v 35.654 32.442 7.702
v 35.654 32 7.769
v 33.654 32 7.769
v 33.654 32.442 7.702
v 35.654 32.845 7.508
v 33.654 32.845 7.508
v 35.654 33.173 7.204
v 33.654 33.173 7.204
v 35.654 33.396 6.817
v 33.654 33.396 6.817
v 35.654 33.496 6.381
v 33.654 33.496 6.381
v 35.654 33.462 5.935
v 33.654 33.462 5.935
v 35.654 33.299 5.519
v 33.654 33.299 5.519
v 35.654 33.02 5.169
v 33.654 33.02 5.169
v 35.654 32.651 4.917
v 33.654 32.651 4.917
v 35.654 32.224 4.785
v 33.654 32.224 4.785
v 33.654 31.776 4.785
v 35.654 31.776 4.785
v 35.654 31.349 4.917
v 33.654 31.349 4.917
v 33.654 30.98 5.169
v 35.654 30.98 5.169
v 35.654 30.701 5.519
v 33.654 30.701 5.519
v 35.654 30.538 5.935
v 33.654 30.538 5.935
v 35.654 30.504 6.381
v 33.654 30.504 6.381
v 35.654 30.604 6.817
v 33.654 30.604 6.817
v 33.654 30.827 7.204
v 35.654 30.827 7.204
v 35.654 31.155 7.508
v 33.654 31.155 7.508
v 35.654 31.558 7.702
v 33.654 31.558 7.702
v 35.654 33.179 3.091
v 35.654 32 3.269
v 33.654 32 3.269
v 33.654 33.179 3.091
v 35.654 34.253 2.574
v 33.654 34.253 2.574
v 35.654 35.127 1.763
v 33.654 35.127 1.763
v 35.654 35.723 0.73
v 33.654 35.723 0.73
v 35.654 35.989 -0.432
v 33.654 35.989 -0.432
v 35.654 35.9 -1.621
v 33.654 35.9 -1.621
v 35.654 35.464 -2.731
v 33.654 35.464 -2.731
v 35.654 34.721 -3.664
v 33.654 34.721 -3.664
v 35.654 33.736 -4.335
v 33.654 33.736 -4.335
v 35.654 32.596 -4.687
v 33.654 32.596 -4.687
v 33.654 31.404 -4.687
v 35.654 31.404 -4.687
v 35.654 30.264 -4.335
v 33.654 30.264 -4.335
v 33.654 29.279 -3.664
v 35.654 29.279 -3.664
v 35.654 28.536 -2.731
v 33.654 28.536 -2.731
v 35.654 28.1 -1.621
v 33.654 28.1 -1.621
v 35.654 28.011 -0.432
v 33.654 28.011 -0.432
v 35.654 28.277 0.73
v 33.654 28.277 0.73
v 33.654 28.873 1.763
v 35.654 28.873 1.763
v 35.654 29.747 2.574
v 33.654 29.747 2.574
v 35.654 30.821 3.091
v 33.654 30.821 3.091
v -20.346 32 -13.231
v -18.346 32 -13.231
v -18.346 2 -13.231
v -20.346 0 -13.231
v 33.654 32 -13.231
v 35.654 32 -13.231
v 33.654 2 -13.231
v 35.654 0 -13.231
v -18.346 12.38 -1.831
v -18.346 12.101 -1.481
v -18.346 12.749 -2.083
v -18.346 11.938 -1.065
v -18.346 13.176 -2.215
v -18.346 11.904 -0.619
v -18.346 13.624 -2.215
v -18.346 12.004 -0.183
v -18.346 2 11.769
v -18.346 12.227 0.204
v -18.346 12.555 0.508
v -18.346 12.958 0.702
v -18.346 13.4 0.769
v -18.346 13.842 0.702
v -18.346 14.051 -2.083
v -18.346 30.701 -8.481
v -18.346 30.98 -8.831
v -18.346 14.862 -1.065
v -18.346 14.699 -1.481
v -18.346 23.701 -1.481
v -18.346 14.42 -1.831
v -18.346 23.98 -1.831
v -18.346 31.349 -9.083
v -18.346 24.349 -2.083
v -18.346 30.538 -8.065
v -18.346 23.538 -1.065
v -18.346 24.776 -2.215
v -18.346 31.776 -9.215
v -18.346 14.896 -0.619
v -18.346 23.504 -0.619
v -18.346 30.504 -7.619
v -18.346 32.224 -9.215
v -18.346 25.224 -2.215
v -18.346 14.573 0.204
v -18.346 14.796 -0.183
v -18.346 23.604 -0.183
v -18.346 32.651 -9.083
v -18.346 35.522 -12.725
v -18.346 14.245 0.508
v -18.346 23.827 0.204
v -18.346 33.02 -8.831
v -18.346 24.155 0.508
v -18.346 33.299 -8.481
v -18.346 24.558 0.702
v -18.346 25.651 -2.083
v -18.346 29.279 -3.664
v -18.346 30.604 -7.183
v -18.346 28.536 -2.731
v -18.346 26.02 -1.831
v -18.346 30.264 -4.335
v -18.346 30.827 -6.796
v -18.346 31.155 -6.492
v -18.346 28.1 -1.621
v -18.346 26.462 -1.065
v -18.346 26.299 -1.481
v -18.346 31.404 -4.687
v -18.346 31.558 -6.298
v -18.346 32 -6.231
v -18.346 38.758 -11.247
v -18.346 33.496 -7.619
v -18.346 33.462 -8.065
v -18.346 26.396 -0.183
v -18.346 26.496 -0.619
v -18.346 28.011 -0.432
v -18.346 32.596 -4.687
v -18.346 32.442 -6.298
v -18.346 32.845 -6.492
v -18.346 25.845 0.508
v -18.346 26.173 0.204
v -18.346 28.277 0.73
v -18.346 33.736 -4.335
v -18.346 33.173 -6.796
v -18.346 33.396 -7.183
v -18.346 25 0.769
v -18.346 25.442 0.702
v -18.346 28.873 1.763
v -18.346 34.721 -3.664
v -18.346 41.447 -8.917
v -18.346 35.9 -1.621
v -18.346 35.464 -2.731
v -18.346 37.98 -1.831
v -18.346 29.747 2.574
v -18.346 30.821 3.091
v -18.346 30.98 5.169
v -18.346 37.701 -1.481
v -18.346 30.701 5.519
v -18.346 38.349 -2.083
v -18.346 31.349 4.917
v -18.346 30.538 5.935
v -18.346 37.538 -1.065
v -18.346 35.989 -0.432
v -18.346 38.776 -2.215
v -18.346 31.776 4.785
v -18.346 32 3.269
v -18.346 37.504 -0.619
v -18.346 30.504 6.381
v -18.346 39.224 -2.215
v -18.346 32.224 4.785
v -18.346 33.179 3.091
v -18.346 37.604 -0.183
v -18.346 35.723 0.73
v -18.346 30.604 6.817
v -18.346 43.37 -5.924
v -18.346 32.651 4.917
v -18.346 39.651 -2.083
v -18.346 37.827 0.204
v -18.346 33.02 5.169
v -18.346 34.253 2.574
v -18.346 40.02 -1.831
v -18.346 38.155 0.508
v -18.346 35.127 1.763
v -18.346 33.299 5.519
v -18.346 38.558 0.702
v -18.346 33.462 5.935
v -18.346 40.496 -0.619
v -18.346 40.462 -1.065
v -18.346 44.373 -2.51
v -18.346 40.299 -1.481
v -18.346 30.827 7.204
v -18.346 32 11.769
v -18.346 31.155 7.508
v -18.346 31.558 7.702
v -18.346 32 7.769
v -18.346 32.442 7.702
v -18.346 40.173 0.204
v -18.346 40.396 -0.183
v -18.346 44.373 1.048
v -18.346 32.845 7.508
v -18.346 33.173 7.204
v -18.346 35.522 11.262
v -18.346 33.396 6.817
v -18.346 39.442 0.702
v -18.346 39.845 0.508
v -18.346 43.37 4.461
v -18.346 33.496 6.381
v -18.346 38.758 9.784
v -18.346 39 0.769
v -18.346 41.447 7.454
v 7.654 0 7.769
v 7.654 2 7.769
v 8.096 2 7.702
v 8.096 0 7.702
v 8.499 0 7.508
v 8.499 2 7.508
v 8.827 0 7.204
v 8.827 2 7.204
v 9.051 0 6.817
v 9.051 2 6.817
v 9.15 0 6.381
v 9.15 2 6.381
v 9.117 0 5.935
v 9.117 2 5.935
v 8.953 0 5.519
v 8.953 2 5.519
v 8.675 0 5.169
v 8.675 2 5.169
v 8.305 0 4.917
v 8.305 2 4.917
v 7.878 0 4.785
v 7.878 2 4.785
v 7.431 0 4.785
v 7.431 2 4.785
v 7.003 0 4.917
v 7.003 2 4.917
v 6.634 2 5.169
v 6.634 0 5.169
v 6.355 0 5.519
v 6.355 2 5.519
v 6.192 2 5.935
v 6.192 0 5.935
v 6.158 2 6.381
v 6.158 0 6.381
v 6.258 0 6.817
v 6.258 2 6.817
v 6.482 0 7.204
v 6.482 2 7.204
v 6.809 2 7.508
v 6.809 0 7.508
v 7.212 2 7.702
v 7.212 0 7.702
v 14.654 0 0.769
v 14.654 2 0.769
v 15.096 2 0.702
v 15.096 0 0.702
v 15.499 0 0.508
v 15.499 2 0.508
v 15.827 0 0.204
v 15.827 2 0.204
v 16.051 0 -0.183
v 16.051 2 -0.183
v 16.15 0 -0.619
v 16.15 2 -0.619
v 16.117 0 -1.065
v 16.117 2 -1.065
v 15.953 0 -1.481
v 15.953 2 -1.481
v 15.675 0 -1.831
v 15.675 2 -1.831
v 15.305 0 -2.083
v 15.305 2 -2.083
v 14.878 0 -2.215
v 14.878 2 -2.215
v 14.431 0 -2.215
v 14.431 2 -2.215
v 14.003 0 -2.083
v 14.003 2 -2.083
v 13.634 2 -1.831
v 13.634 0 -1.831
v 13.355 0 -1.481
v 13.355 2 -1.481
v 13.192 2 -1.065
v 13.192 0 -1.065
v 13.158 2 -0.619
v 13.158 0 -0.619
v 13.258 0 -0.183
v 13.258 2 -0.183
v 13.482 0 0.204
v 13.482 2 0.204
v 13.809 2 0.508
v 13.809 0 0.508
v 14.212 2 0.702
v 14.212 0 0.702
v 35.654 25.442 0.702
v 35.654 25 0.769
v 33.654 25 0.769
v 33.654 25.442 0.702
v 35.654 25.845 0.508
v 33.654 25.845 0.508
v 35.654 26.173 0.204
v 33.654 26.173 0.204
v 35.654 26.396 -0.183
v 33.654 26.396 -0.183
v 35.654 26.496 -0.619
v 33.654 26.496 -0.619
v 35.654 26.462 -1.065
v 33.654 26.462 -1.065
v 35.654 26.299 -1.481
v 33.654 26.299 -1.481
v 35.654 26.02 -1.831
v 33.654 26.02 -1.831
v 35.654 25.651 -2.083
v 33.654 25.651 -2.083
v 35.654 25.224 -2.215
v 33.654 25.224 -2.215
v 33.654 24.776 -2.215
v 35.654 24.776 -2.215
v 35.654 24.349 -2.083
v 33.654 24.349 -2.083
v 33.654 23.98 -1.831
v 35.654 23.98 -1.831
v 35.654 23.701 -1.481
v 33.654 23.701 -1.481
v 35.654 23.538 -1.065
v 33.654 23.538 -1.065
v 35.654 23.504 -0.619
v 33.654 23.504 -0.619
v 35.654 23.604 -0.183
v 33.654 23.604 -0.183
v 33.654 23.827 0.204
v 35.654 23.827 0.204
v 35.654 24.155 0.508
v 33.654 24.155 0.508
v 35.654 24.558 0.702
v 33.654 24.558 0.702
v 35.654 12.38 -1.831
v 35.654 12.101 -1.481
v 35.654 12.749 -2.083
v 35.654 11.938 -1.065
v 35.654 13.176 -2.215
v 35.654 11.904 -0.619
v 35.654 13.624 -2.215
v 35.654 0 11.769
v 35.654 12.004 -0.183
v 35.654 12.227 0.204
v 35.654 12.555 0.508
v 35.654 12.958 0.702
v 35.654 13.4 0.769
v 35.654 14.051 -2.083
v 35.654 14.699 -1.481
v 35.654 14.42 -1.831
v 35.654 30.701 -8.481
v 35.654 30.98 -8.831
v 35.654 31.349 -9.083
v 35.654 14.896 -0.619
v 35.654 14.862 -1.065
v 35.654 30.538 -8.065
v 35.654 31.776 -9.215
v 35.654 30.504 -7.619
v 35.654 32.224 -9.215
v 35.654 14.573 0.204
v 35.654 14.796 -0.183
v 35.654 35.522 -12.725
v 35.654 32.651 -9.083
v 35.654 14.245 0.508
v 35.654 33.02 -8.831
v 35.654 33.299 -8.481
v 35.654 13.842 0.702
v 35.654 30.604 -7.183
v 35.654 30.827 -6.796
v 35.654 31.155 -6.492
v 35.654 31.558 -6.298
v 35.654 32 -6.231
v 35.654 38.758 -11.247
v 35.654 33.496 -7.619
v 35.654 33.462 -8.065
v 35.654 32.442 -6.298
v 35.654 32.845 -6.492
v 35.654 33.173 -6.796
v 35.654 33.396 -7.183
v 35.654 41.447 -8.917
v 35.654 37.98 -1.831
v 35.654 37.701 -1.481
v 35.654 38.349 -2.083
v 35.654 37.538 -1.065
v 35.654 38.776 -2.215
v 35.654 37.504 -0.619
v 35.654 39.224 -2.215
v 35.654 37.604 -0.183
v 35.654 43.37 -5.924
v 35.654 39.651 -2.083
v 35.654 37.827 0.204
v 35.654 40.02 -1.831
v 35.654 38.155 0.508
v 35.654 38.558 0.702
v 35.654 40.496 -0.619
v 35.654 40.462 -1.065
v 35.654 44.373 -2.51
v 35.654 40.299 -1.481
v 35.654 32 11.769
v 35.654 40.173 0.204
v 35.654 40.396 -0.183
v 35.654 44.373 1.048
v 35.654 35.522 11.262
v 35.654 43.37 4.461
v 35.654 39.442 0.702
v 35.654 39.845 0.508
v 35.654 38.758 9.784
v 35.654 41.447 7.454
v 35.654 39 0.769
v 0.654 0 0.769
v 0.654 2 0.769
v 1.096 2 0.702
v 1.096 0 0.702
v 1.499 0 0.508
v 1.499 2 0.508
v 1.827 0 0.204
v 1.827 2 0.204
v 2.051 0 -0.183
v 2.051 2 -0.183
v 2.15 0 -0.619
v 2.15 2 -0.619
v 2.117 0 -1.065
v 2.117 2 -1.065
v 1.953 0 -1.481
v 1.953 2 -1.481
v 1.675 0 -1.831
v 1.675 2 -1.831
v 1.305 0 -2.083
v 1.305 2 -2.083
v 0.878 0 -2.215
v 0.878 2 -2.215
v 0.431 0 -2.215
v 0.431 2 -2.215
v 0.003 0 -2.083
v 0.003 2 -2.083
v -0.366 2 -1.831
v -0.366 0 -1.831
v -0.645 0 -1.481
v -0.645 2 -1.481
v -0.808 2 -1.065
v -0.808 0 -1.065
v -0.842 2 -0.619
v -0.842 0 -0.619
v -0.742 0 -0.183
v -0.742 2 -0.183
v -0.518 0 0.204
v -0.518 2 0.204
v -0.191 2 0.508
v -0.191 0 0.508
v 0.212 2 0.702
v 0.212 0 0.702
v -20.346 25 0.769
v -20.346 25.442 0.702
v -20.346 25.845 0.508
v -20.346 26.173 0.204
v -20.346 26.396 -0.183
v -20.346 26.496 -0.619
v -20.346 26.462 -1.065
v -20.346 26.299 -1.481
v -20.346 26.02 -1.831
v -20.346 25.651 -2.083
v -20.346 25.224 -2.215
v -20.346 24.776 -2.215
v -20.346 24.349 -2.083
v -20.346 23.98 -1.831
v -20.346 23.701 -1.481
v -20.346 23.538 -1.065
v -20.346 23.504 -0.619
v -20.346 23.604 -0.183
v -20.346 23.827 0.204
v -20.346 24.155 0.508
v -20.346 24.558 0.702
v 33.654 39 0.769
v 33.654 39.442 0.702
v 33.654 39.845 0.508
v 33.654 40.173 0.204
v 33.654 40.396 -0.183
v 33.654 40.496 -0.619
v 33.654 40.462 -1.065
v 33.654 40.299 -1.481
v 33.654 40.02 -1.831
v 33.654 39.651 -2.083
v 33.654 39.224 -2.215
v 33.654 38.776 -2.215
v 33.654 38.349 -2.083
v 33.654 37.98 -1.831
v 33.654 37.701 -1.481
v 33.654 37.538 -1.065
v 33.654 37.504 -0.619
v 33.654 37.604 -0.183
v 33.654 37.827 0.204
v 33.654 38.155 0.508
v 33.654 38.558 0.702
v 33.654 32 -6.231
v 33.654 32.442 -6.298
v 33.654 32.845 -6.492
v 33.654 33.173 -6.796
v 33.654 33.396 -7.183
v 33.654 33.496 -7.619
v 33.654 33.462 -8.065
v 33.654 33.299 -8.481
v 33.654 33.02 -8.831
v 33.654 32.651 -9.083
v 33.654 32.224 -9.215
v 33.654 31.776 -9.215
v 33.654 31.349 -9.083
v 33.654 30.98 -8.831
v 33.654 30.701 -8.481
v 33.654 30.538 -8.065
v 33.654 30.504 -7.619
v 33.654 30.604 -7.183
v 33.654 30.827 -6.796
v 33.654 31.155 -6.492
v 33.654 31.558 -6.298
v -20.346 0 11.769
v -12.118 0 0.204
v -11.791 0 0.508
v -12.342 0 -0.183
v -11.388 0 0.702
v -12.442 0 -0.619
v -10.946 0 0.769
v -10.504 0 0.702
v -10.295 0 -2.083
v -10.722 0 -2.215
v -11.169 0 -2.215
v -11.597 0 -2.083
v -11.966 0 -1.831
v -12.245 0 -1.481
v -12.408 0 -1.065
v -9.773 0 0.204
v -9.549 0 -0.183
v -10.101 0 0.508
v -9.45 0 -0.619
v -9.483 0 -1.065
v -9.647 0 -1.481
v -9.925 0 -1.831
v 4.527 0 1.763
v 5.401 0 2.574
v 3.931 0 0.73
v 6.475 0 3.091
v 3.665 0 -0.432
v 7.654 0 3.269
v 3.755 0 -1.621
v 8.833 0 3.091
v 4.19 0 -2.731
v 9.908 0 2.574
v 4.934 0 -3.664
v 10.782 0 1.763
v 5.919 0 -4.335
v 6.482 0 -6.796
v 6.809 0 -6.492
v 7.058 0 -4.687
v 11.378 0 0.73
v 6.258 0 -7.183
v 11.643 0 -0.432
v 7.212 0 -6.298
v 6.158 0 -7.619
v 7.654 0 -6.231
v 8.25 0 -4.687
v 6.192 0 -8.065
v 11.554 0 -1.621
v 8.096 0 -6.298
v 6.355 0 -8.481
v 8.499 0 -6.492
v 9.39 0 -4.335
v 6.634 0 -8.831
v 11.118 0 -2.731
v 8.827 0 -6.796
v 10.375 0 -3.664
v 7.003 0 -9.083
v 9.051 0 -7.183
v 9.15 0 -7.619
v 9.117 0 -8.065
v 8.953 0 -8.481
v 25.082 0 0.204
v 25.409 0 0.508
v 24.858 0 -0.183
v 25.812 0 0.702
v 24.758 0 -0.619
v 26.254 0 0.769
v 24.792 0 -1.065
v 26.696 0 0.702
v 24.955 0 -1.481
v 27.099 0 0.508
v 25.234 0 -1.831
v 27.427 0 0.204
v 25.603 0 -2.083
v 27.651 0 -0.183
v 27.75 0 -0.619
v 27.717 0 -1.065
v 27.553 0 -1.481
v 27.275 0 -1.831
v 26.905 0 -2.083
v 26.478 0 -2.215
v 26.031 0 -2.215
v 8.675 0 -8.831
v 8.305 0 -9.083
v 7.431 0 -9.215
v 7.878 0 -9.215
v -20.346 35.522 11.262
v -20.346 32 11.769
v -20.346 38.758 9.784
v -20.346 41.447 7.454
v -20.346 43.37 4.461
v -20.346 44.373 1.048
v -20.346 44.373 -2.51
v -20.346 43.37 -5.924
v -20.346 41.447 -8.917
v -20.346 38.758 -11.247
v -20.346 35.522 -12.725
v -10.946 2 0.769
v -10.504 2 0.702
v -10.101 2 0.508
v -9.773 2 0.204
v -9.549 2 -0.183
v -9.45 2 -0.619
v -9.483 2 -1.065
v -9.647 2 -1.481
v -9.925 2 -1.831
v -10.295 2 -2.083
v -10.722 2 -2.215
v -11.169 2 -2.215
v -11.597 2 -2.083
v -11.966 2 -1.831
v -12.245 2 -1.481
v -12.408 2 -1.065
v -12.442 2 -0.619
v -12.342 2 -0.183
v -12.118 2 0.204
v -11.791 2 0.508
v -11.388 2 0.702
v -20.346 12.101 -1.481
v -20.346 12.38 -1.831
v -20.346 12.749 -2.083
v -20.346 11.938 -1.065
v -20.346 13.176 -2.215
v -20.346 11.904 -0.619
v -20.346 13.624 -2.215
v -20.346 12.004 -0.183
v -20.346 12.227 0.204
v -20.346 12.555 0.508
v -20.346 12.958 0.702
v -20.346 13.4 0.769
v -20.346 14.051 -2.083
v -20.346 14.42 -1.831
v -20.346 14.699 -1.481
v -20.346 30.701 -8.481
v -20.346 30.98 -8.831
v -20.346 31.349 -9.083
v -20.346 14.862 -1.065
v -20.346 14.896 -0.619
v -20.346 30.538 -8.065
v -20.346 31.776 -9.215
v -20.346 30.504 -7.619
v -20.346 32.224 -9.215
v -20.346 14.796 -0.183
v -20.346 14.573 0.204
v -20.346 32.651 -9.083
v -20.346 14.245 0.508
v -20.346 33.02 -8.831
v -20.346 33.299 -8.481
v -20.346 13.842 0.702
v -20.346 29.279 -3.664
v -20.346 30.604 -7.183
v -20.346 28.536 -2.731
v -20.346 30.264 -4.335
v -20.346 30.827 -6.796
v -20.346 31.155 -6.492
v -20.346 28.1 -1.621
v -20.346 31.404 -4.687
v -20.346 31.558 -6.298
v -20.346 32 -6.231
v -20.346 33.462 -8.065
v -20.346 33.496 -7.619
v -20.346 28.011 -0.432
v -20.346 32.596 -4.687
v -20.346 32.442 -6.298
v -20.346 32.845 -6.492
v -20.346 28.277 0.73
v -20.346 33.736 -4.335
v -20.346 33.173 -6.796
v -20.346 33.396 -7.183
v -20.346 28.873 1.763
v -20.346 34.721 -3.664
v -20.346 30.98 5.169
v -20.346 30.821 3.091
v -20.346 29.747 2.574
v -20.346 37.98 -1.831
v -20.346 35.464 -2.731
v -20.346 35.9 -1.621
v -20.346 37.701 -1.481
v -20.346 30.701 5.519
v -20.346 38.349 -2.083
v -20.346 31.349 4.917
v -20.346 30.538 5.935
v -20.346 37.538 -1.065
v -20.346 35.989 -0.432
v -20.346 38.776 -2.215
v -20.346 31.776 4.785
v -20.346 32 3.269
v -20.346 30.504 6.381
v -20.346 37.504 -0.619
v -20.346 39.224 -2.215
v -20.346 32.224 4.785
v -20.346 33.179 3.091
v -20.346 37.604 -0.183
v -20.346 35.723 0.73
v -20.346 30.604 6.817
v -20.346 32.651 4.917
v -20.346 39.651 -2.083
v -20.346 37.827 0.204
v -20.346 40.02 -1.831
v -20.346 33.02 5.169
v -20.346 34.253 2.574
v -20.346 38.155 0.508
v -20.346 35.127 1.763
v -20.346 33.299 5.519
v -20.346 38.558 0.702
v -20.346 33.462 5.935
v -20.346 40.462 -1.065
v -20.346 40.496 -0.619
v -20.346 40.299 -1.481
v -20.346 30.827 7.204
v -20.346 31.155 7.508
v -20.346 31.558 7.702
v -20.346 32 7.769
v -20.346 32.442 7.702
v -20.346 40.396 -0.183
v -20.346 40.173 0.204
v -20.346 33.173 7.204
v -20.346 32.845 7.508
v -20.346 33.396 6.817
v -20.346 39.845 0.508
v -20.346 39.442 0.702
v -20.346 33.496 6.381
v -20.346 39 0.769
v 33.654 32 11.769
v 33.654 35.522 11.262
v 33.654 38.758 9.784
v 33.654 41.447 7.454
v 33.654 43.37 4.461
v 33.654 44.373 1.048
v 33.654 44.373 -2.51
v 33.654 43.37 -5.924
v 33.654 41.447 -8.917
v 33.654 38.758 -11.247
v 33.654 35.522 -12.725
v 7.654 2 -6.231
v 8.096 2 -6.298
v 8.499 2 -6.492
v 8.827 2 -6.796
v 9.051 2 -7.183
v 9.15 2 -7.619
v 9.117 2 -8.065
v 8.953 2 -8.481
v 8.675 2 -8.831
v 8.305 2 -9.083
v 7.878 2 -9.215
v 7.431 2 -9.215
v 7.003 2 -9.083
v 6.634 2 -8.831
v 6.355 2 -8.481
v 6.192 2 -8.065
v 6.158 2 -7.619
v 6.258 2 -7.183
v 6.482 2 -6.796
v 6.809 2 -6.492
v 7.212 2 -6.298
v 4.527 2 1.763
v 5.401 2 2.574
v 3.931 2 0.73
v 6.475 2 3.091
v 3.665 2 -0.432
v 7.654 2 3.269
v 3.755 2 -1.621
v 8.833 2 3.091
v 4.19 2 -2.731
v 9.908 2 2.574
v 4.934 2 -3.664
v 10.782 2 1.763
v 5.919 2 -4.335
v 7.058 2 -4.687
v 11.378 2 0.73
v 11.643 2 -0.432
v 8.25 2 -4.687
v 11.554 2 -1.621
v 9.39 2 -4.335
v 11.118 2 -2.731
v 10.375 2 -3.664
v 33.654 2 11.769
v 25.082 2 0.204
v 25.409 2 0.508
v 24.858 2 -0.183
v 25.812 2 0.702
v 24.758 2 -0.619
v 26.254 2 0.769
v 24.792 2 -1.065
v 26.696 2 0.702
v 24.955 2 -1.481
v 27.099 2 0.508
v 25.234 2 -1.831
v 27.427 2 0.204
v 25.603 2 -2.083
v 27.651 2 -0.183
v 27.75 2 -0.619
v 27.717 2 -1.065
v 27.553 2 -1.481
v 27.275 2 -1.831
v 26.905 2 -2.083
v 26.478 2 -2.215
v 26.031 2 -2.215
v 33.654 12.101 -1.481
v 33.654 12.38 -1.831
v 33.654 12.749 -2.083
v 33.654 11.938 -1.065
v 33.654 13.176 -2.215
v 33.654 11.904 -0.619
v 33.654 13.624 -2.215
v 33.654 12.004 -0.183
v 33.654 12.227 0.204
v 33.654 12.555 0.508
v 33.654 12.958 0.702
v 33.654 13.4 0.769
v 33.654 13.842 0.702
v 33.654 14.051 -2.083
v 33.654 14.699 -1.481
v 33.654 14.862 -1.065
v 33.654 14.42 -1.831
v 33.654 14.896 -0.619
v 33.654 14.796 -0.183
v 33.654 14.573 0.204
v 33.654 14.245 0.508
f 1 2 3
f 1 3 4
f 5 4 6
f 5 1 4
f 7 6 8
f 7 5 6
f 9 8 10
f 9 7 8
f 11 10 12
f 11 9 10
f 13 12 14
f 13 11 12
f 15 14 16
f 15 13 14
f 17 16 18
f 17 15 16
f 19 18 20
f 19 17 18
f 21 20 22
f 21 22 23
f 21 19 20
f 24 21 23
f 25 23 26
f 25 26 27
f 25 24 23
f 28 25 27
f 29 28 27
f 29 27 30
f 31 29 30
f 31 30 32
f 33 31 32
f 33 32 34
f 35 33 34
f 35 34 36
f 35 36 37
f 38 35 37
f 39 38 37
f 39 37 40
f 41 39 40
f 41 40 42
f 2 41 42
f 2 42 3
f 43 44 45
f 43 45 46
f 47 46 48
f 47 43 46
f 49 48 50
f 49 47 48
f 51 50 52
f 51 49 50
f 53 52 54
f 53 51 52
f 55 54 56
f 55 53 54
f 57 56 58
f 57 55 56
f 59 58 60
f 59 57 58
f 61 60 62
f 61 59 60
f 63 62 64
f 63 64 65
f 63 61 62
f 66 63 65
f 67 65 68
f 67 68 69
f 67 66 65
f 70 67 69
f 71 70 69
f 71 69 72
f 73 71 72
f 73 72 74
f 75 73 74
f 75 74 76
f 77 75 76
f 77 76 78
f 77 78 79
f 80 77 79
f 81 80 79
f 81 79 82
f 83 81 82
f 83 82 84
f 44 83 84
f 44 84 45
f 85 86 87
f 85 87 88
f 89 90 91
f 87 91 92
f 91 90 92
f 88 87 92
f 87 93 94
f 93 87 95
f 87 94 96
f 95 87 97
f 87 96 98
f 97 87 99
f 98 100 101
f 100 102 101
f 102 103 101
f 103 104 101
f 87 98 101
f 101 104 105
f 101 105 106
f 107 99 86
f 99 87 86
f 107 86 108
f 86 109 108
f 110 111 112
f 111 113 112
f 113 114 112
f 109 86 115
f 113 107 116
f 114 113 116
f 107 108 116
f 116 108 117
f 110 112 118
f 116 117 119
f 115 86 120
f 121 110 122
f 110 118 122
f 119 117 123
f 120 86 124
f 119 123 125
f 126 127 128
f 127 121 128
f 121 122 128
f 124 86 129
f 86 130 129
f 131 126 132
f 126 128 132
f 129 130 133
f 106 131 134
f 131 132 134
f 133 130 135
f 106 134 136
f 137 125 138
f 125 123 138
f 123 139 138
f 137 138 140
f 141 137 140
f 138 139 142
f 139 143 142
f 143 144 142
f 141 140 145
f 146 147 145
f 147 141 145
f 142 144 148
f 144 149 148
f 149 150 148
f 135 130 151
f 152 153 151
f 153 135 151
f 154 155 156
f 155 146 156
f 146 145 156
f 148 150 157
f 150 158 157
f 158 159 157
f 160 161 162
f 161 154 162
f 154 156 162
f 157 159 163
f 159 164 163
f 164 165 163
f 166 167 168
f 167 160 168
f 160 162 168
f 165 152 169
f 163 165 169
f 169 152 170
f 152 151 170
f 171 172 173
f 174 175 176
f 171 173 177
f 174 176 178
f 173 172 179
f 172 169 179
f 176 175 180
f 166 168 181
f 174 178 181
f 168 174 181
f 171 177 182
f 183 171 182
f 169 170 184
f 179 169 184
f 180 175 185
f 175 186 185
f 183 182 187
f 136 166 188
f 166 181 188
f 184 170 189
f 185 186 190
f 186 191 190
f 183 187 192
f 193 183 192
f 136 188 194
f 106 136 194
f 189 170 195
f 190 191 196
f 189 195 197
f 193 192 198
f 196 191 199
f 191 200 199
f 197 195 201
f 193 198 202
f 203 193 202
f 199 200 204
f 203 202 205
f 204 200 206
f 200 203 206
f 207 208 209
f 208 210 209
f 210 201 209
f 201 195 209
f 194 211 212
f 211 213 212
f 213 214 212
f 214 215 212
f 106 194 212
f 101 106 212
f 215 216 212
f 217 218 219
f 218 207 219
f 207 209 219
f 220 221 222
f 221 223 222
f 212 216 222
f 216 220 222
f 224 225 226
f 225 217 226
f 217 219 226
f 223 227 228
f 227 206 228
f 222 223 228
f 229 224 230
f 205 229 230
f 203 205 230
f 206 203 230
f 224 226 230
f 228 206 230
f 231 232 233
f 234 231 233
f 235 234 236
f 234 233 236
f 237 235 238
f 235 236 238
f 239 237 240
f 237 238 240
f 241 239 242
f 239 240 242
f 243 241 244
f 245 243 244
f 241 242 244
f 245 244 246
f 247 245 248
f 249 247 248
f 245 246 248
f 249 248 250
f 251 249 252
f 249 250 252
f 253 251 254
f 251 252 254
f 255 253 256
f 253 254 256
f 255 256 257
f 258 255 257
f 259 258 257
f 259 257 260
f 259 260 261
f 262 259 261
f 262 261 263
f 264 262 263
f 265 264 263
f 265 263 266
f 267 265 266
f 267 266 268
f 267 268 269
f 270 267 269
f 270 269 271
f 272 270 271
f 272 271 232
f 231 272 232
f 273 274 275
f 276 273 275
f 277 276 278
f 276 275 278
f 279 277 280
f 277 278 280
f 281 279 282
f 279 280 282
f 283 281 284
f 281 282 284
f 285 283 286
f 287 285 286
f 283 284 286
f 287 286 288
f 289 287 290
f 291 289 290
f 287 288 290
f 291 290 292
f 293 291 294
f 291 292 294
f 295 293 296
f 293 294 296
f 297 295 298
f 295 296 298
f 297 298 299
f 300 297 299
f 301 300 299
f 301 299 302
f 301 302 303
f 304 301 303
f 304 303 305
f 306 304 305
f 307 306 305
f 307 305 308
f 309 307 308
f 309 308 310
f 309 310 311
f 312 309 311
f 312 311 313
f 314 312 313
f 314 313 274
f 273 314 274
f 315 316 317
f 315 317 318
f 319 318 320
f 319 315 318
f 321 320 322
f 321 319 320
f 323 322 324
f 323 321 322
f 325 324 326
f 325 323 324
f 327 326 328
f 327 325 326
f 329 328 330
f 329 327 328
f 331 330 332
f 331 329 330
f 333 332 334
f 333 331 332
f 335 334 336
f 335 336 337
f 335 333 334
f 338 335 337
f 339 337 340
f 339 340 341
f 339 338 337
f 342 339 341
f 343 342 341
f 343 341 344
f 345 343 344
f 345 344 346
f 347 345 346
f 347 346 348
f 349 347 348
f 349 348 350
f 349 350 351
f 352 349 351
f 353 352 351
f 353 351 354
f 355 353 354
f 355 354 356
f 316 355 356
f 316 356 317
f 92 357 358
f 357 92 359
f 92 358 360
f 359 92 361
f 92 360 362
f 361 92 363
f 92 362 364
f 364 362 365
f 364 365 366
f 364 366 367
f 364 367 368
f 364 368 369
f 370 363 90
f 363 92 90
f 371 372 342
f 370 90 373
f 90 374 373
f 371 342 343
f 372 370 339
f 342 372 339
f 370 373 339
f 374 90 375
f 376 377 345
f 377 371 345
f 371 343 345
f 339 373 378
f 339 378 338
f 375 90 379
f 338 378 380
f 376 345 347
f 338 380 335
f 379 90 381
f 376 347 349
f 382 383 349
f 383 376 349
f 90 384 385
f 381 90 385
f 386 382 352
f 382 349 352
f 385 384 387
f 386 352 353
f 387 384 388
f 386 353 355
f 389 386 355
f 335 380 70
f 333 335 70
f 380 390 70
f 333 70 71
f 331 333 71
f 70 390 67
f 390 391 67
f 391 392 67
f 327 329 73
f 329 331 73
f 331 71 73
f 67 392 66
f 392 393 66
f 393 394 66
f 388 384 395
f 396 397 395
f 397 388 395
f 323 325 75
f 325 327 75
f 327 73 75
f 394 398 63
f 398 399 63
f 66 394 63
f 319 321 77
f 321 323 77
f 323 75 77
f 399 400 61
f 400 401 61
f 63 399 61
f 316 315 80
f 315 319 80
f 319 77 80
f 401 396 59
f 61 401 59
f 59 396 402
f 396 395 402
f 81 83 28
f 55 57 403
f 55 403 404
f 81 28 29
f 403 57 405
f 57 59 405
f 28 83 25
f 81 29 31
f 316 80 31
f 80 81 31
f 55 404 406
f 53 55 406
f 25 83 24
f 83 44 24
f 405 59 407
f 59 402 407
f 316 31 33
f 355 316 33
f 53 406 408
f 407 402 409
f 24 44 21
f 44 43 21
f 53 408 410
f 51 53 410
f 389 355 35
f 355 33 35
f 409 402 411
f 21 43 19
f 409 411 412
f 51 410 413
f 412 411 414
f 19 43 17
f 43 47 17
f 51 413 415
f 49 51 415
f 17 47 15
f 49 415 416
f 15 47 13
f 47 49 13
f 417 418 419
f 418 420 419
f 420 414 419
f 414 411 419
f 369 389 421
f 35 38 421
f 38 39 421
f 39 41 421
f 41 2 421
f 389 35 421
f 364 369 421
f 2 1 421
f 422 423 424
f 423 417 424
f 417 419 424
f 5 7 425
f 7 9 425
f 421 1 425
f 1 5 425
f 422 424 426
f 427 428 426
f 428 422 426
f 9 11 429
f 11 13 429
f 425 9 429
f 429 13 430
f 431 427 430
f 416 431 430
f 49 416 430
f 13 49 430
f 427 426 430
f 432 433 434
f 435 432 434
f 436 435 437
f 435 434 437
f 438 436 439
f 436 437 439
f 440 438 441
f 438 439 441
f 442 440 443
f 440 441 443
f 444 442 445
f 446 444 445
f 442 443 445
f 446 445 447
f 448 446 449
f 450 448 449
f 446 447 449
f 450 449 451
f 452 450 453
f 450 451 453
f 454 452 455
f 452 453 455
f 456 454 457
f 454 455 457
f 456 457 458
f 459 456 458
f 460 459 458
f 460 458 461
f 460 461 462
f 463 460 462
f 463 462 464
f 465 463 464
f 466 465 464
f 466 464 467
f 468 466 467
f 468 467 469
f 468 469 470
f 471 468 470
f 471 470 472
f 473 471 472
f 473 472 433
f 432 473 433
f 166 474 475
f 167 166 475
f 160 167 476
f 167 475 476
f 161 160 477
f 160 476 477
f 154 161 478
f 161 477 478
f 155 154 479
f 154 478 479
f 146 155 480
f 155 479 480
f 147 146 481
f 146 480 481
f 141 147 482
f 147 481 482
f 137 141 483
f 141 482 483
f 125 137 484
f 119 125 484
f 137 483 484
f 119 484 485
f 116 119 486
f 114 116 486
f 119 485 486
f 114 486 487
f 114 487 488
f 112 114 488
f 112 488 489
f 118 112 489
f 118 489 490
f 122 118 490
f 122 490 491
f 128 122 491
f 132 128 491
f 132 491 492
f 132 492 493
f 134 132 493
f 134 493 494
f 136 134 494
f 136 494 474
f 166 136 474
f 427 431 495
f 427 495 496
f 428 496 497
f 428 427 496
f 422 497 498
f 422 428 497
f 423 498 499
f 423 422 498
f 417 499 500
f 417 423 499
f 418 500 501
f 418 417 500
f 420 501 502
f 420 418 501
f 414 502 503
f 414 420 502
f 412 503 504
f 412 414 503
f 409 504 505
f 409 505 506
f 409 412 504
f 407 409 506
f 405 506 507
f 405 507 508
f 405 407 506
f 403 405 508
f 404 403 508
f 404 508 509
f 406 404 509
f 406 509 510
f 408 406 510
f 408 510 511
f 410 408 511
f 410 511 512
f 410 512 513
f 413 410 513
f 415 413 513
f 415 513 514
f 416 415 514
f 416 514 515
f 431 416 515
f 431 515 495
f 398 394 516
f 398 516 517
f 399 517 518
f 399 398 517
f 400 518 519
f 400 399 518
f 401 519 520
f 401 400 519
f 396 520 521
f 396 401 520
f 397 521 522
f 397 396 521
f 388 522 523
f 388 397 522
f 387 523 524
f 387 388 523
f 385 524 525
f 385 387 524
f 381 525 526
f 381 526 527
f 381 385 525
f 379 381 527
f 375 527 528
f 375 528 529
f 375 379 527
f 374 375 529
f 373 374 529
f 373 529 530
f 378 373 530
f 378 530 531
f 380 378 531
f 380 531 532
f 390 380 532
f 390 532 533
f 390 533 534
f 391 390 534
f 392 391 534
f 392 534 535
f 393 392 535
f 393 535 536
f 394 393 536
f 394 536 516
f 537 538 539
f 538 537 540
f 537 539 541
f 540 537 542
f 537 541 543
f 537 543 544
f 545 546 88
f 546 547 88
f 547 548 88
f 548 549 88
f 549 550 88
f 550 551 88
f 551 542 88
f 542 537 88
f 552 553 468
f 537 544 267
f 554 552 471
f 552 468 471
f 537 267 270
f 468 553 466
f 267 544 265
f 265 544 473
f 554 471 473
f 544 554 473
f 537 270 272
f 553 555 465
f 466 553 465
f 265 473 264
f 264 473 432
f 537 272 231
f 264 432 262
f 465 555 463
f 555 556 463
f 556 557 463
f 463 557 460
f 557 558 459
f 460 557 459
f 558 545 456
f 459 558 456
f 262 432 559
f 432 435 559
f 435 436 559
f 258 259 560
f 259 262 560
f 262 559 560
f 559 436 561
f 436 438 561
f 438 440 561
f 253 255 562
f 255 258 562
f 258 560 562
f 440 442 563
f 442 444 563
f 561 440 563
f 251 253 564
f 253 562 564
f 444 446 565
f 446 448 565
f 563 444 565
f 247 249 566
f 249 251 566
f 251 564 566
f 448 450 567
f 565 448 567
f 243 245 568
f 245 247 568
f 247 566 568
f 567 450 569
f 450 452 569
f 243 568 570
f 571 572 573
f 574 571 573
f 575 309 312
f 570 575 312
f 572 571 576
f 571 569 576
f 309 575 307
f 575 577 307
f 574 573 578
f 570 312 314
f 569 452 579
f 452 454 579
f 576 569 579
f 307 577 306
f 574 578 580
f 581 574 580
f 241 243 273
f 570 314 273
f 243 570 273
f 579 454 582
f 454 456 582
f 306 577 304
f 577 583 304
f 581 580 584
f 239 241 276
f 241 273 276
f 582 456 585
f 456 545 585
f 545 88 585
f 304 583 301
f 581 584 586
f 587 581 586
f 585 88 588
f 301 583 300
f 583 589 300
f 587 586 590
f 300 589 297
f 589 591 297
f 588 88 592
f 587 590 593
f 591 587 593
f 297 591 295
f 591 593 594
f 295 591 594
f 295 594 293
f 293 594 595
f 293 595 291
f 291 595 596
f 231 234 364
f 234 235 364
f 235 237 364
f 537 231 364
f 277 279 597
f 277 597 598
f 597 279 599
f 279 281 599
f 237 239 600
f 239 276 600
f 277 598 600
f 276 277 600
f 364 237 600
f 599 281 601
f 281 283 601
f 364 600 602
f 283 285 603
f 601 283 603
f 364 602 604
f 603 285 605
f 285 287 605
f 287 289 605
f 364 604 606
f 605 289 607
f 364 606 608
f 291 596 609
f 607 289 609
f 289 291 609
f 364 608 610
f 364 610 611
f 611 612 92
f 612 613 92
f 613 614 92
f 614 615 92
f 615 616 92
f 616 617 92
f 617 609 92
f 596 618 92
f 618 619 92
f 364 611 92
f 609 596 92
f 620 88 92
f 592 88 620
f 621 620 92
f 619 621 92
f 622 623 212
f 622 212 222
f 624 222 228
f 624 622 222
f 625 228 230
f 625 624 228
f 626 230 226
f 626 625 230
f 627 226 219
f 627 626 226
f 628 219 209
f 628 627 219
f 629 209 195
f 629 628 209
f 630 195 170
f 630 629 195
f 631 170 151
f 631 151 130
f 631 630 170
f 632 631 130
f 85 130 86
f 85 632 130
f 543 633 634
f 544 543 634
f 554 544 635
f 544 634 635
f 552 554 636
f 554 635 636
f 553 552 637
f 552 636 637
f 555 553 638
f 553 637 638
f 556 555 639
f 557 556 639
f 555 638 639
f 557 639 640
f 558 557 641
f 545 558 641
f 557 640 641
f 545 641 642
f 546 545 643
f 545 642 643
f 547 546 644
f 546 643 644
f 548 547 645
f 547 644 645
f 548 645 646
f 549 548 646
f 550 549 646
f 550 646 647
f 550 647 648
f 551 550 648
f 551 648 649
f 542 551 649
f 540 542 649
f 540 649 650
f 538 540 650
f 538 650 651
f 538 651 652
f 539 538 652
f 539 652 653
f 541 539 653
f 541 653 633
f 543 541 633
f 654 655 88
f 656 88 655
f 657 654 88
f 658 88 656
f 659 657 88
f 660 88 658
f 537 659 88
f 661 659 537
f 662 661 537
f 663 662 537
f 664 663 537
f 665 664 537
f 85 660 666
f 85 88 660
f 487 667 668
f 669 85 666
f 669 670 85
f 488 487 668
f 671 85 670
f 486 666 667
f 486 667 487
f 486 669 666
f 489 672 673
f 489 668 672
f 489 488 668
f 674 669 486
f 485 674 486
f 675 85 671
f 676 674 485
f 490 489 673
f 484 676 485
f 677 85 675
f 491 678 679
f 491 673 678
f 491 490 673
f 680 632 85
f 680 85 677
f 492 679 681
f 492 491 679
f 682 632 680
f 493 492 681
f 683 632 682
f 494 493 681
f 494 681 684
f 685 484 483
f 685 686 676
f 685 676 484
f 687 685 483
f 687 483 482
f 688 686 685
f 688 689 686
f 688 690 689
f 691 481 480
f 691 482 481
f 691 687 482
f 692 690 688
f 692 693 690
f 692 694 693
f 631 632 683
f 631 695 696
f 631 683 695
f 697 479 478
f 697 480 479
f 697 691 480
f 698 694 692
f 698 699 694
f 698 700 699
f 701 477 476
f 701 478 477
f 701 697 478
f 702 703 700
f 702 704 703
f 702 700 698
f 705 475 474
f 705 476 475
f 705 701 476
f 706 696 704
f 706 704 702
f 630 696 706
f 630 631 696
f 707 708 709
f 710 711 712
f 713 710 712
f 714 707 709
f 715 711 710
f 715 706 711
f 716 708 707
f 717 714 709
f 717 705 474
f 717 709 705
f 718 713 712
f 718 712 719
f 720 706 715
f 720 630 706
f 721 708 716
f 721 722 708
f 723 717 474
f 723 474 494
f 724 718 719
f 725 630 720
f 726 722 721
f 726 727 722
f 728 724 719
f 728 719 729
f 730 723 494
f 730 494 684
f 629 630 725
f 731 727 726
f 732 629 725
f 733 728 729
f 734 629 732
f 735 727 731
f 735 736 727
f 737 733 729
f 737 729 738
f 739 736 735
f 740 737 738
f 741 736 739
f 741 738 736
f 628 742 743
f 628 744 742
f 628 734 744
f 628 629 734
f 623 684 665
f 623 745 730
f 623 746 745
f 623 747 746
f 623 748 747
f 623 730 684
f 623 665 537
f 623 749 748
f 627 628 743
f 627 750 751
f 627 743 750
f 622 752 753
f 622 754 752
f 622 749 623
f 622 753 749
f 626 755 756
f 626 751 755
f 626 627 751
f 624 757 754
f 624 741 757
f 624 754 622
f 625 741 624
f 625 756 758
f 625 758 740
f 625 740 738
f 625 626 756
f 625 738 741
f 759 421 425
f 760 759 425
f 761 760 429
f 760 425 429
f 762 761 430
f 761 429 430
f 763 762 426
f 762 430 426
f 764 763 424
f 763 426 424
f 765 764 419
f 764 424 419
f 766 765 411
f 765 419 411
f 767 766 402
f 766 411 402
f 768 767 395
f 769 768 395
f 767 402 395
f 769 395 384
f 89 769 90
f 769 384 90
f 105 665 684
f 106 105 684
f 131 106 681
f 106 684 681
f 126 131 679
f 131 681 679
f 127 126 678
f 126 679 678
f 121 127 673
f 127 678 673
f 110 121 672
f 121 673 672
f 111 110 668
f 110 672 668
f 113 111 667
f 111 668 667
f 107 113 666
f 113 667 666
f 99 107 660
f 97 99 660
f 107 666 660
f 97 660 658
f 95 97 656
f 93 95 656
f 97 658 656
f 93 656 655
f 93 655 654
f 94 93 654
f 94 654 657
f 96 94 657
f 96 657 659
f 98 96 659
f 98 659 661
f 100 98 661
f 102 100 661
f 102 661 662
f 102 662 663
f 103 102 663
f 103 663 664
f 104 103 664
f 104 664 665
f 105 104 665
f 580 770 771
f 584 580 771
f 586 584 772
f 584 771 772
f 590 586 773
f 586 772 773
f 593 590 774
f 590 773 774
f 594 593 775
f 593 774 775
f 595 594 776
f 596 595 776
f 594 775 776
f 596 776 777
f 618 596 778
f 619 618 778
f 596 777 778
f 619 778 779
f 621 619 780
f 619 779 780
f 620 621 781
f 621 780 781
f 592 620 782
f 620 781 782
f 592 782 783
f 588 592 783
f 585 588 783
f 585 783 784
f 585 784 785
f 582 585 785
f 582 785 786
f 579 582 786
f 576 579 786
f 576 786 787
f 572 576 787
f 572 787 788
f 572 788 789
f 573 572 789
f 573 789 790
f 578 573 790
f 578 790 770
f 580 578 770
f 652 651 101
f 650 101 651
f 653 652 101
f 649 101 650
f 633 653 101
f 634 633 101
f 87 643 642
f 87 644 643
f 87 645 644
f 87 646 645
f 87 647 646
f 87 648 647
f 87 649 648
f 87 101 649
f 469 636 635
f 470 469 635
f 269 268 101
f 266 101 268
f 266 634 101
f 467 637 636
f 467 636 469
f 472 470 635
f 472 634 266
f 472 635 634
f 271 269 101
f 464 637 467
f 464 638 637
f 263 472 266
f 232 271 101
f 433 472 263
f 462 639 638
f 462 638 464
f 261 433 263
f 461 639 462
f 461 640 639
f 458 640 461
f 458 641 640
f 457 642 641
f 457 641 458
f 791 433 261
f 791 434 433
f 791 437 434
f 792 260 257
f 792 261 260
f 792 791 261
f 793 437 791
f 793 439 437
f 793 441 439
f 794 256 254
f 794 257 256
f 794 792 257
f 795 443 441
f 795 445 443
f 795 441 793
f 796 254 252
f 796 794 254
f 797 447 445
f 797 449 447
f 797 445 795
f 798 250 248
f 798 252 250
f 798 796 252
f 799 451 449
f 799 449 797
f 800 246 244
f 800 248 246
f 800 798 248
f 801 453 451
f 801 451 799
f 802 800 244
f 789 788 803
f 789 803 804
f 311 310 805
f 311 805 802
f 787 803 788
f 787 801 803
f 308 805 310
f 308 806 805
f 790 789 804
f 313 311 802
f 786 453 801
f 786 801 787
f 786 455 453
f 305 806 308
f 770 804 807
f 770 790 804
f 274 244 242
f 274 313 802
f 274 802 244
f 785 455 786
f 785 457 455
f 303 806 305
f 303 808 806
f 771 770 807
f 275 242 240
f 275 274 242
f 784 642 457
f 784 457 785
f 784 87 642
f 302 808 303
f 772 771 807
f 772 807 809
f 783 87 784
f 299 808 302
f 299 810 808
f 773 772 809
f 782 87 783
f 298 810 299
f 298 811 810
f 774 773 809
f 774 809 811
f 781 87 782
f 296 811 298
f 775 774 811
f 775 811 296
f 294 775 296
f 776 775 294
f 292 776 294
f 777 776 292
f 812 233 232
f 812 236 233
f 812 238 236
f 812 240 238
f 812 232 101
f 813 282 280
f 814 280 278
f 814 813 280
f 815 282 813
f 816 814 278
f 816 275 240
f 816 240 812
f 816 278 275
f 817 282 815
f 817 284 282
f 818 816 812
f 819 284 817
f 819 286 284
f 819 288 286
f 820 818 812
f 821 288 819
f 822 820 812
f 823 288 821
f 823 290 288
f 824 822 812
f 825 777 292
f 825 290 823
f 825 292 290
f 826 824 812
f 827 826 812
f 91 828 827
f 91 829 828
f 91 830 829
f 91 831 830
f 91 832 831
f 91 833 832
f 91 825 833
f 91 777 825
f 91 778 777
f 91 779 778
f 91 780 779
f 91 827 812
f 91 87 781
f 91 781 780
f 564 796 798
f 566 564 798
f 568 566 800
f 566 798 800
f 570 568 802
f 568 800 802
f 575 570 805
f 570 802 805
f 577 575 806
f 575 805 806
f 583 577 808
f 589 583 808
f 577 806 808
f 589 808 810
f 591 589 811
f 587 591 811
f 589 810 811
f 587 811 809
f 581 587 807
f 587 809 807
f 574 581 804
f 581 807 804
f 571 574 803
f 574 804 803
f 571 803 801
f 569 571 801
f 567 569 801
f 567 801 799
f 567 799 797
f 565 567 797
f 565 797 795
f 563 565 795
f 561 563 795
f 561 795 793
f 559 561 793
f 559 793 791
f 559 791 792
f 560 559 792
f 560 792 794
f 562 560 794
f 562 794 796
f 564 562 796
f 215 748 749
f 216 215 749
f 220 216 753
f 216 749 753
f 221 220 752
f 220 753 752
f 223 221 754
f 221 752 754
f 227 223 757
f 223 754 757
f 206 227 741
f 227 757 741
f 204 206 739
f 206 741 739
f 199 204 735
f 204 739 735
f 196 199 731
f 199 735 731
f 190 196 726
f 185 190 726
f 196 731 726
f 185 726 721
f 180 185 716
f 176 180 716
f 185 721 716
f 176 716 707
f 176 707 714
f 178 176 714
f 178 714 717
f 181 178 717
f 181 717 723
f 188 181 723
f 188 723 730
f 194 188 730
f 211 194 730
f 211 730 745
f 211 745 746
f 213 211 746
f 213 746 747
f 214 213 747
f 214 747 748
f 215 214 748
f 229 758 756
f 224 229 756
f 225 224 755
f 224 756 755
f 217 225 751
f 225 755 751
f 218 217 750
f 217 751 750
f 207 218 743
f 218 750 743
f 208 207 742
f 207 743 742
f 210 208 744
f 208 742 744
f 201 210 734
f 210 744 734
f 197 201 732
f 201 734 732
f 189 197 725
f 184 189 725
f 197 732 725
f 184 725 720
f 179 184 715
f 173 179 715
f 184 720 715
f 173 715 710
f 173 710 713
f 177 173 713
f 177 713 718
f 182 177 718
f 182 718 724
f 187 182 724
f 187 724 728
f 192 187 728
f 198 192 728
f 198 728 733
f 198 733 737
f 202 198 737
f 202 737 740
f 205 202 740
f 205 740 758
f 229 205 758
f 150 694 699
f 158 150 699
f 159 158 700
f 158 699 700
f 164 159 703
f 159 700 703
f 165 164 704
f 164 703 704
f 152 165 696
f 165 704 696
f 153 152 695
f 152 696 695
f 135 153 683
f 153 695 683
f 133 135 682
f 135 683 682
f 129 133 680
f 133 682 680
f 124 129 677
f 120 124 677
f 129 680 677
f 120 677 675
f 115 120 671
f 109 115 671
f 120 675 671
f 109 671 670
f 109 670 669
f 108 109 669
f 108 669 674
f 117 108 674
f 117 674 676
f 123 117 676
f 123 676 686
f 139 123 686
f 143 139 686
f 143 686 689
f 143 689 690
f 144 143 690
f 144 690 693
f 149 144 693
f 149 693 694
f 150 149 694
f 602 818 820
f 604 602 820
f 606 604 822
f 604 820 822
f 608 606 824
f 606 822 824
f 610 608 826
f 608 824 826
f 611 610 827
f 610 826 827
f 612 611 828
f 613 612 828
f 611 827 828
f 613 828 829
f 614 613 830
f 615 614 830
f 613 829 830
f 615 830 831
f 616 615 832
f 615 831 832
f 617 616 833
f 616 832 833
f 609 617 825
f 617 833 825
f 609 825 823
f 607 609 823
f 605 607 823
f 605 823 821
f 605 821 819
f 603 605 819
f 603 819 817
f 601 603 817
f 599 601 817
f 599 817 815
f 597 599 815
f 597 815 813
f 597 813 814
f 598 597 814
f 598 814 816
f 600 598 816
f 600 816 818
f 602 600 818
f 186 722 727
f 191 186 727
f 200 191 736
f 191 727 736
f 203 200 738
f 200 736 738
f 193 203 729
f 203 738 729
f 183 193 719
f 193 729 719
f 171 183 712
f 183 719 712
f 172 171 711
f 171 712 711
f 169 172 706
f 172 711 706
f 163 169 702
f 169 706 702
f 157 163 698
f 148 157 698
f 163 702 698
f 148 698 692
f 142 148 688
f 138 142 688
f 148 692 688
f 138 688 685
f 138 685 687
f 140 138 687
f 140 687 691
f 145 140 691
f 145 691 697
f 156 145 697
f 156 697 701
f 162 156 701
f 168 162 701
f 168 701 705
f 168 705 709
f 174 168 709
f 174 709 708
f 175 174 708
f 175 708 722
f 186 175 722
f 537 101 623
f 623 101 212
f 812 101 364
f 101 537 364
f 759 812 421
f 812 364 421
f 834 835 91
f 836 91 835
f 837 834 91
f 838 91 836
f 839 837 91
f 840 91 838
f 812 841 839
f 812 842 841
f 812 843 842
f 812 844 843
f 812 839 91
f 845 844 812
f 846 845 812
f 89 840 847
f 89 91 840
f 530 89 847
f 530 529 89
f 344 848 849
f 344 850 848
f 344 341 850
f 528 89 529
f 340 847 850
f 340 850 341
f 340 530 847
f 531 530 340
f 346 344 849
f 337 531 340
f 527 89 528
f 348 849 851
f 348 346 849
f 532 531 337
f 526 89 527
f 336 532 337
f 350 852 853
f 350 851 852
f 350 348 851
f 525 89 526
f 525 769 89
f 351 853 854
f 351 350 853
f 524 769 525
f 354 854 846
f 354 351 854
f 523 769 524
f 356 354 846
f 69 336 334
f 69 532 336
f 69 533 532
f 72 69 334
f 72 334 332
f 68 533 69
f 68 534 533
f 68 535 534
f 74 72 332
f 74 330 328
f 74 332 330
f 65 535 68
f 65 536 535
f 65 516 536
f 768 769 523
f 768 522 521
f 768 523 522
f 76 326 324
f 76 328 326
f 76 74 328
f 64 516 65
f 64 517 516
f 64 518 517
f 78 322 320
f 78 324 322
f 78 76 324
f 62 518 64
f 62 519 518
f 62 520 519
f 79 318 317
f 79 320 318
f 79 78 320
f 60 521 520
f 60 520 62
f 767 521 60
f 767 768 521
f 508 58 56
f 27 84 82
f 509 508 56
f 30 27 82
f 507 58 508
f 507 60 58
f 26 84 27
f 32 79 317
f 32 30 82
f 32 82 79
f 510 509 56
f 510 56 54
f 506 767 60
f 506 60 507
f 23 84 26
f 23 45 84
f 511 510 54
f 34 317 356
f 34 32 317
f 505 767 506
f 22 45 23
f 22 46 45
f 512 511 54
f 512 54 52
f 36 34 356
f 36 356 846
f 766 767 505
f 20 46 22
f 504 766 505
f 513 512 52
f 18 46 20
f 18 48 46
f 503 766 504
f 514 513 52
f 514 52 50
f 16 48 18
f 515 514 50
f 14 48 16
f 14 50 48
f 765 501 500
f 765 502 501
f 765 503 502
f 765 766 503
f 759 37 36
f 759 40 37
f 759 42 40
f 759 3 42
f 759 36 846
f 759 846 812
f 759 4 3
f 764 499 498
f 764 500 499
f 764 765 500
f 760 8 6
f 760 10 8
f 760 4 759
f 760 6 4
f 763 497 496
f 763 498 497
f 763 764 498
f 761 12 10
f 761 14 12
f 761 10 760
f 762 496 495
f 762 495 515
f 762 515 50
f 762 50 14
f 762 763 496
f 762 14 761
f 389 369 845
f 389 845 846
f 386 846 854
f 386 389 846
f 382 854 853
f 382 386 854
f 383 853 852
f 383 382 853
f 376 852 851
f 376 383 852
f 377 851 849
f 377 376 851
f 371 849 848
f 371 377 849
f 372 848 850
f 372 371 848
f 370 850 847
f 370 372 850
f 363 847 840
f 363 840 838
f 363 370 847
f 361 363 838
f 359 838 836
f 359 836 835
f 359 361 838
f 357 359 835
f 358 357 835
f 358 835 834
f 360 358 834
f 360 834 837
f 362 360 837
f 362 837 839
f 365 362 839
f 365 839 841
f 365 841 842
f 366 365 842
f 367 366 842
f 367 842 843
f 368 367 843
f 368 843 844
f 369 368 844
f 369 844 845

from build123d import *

# Parameters (mm, degrees)
SKETCH_1_W          = 56
SKETCH_1_H          = 25
EXTRUDE_1_DEPTH     = 2
SKETCH_2_R          = 4
SKETCH_2_R_2        = 1.5
CUT_EXTRUDE_1_DEPTH = 39.082744359
EXTRUDE_2_DEPTH     = 2
CUT_EXTRUDE_2_REACH = 74.741
SKETCH_4_R          = 4
SKETCH_4_R_2        = 1.5


with BuildPart() as part:
    # 草图1 → 凸台-拉伸1 (new body)
    with BuildSketch(Plane(origin=(0, 0, 0), x_dir=(1, 0, 0), z_dir=(0, 1, 0))):
        with Locations((7.654255319, 0.731382979)):
            Rectangle(SKETCH_1_W, SKETCH_1_H)
    extrude(amount=EXTRUDE_1_DEPTH)

    # 草图2 → 切除-拉伸1 (cut, through all)
    with BuildSketch(Plane(origin=(0, 2, 0), x_dir=(1, 0, 0), z_dir=(0, 1, 0))):
        with Locations(Location((7.654255319, 0.731382979, 0), (0, 0, 270))):
            Circle(SKETCH_2_R)
        with Locations(Location((7.654255319, 7.731382979, 0), (0, 0, 270))):
            Circle(SKETCH_2_R_2)
        with Locations(Location((14.654255319, 0.731382979, 0), (0, 0, 270))):
            Circle(SKETCH_2_R_2)
        with Locations(Location((7.654255319, -6.268617021, 0), (0, 0, 270))):
            Circle(SKETCH_2_R_2)
        with Locations(Location((0.654255319, 0.731382979, 0), (0, 0, 270))):
            Circle(SKETCH_2_R_2)
        with Locations(Location((-10.945744681, 0.731382979, 0), (0, 0, 270))):
            Circle(SKETCH_2_R_2)
        with Locations(Location((26.254255319, 0.731382979, 0), (0, 0, 270))):
            Circle(SKETCH_2_R_2)
    extrude(amount=-CUT_EXTRUDE_1_DEPTH, mode=Mode.SUBTRACT)

    # 草图3 → 凸台-拉伸2 (add)
    with BuildSketch(Plane.ZY.offset(20.345744681)):
        with BuildLine():
            Line((-13.231382979, 2), (11.768617021, 2))
            Line((11.768617021, 2), (11.768617021, 32))
            ThreePointArc((11.768617021, 32), (-0.731382979, 44.5), (-13.231382979, 32))
            Line((-13.231382979, 32), (-13.231382979, 2))
        make_face()
    extrude_2 = extrude(amount=-EXTRUDE_2_DEPTH)

    # 草图4 → 切除-拉伸2 (cut, up to next)
    with BuildSketch(Plane.ZY.offset(20.345744681), mode=Mode.PRIVATE) as cut_extrude_2_sk1:
        with Locations((-0.731382979, 32)):
            Circle(SKETCH_4_R)
    cut_extrude_2_tool1 = extrude(cut_extrude_2_sk1.sketch, amount=-CUT_EXTRUDE_2_REACH, mode=Mode.PRIVATE) & part.part
    # 草图4 → 切除-拉伸2 (cut, up to next)
    with BuildSketch(Plane.ZY.offset(20.345744681), mode=Mode.PRIVATE) as cut_extrude_2_sk2:
        with Locations((-0.731382979, 39)):
            Circle(SKETCH_4_R_2)
    cut_extrude_2_tool2 = extrude(cut_extrude_2_sk2.sketch, amount=-CUT_EXTRUDE_2_REACH, mode=Mode.PRIVATE) & part.part
    # 草图4 → 切除-拉伸2 (cut, up to next)
    with BuildSketch(Plane.ZY.offset(20.345744681), mode=Mode.PRIVATE) as cut_extrude_2_sk3:
        with Locations((6.268617021, 32)):
            Circle(SKETCH_4_R_2)
    cut_extrude_2_tool3 = extrude(cut_extrude_2_sk3.sketch, amount=-CUT_EXTRUDE_2_REACH, mode=Mode.PRIVATE) & part.part
    # 草图4 → 切除-拉伸2 (cut, up to next)
    with BuildSketch(Plane.ZY.offset(20.345744681), mode=Mode.PRIVATE) as cut_extrude_2_sk4:
        with Locations((-0.731382979, 25)):
            Circle(SKETCH_4_R_2)
    cut_extrude_2_tool4 = extrude(cut_extrude_2_sk4.sketch, amount=-CUT_EXTRUDE_2_REACH, mode=Mode.PRIVATE) & part.part
    # 草图4 → 切除-拉伸2 (cut, up to next)
    with BuildSketch(Plane.ZY.offset(20.345744681), mode=Mode.PRIVATE) as cut_extrude_2_sk5:
        with Locations((-7.731382979, 32)):
            Circle(SKETCH_4_R_2)
    cut_extrude_2_tool5 = extrude(cut_extrude_2_sk5.sketch, amount=-CUT_EXTRUDE_2_REACH, mode=Mode.PRIVATE) & part.part
    # 草图4 → 切除-拉伸2 (cut, up to next)
    with BuildSketch(Plane.ZY.offset(20.345744681), mode=Mode.PRIVATE) as cut_extrude_2_sk6:
        with Locations((-0.731382979, 13.4)):
            Circle(SKETCH_4_R_2)
    cut_extrude_2_tool6 = extrude(cut_extrude_2_sk6.sketch, amount=-CUT_EXTRUDE_2_REACH, mode=Mode.PRIVATE) & part.part
    cut_extrude_2_1 = cut_extrude_2_tool1.solids().sort_by_distance((-20.345745, 32, -0.731383))[0]
    add(cut_extrude_2_1, mode=Mode.SUBTRACT)
    cut_extrude_2_2 = cut_extrude_2_tool2.solids().sort_by_distance((-20.345745, 39, -0.731383))[0]
    add(cut_extrude_2_2, mode=Mode.SUBTRACT)
    cut_extrude_2_3 = cut_extrude_2_tool3.solids().sort_by_distance((-20.345745, 32, 6.268617))[0]
    add(cut_extrude_2_3, mode=Mode.SUBTRACT)
    cut_extrude_2_4 = cut_extrude_2_tool4.solids().sort_by_distance((-20.345745, 25, -0.731383))[0]
    add(cut_extrude_2_4, mode=Mode.SUBTRACT)
    cut_extrude_2_5 = cut_extrude_2_tool5.solids().sort_by_distance((-20.345745, 32, -7.731383))[0]
    add(cut_extrude_2_5, mode=Mode.SUBTRACT)
    cut_extrude_2_6 = cut_extrude_2_tool6.solids().sort_by_distance((-20.345745, 13.4, -0.731383))[0]
    add(cut_extrude_2_6, mode=Mode.SUBTRACT)
    cut_extrude_2 = cut_extrude_2_1 + cut_extrude_2_2 + cut_extrude_2_3 + cut_extrude_2_4 + cut_extrude_2_5 + cut_extrude_2_6  # 切除-拉伸2 as one shape, for the pattern or mirror that repeats it

    # 镜向1: 凸台-拉伸2, 切除-拉伸2 across plane
    add(extrude_2.mirror(Plane.ZY.offset(-7.654255319)))
    add(cut_extrude_2.mirror(Plane.ZY.offset(-7.654255319)), mode=Mode.SUBTRACT)


solid = part.part
